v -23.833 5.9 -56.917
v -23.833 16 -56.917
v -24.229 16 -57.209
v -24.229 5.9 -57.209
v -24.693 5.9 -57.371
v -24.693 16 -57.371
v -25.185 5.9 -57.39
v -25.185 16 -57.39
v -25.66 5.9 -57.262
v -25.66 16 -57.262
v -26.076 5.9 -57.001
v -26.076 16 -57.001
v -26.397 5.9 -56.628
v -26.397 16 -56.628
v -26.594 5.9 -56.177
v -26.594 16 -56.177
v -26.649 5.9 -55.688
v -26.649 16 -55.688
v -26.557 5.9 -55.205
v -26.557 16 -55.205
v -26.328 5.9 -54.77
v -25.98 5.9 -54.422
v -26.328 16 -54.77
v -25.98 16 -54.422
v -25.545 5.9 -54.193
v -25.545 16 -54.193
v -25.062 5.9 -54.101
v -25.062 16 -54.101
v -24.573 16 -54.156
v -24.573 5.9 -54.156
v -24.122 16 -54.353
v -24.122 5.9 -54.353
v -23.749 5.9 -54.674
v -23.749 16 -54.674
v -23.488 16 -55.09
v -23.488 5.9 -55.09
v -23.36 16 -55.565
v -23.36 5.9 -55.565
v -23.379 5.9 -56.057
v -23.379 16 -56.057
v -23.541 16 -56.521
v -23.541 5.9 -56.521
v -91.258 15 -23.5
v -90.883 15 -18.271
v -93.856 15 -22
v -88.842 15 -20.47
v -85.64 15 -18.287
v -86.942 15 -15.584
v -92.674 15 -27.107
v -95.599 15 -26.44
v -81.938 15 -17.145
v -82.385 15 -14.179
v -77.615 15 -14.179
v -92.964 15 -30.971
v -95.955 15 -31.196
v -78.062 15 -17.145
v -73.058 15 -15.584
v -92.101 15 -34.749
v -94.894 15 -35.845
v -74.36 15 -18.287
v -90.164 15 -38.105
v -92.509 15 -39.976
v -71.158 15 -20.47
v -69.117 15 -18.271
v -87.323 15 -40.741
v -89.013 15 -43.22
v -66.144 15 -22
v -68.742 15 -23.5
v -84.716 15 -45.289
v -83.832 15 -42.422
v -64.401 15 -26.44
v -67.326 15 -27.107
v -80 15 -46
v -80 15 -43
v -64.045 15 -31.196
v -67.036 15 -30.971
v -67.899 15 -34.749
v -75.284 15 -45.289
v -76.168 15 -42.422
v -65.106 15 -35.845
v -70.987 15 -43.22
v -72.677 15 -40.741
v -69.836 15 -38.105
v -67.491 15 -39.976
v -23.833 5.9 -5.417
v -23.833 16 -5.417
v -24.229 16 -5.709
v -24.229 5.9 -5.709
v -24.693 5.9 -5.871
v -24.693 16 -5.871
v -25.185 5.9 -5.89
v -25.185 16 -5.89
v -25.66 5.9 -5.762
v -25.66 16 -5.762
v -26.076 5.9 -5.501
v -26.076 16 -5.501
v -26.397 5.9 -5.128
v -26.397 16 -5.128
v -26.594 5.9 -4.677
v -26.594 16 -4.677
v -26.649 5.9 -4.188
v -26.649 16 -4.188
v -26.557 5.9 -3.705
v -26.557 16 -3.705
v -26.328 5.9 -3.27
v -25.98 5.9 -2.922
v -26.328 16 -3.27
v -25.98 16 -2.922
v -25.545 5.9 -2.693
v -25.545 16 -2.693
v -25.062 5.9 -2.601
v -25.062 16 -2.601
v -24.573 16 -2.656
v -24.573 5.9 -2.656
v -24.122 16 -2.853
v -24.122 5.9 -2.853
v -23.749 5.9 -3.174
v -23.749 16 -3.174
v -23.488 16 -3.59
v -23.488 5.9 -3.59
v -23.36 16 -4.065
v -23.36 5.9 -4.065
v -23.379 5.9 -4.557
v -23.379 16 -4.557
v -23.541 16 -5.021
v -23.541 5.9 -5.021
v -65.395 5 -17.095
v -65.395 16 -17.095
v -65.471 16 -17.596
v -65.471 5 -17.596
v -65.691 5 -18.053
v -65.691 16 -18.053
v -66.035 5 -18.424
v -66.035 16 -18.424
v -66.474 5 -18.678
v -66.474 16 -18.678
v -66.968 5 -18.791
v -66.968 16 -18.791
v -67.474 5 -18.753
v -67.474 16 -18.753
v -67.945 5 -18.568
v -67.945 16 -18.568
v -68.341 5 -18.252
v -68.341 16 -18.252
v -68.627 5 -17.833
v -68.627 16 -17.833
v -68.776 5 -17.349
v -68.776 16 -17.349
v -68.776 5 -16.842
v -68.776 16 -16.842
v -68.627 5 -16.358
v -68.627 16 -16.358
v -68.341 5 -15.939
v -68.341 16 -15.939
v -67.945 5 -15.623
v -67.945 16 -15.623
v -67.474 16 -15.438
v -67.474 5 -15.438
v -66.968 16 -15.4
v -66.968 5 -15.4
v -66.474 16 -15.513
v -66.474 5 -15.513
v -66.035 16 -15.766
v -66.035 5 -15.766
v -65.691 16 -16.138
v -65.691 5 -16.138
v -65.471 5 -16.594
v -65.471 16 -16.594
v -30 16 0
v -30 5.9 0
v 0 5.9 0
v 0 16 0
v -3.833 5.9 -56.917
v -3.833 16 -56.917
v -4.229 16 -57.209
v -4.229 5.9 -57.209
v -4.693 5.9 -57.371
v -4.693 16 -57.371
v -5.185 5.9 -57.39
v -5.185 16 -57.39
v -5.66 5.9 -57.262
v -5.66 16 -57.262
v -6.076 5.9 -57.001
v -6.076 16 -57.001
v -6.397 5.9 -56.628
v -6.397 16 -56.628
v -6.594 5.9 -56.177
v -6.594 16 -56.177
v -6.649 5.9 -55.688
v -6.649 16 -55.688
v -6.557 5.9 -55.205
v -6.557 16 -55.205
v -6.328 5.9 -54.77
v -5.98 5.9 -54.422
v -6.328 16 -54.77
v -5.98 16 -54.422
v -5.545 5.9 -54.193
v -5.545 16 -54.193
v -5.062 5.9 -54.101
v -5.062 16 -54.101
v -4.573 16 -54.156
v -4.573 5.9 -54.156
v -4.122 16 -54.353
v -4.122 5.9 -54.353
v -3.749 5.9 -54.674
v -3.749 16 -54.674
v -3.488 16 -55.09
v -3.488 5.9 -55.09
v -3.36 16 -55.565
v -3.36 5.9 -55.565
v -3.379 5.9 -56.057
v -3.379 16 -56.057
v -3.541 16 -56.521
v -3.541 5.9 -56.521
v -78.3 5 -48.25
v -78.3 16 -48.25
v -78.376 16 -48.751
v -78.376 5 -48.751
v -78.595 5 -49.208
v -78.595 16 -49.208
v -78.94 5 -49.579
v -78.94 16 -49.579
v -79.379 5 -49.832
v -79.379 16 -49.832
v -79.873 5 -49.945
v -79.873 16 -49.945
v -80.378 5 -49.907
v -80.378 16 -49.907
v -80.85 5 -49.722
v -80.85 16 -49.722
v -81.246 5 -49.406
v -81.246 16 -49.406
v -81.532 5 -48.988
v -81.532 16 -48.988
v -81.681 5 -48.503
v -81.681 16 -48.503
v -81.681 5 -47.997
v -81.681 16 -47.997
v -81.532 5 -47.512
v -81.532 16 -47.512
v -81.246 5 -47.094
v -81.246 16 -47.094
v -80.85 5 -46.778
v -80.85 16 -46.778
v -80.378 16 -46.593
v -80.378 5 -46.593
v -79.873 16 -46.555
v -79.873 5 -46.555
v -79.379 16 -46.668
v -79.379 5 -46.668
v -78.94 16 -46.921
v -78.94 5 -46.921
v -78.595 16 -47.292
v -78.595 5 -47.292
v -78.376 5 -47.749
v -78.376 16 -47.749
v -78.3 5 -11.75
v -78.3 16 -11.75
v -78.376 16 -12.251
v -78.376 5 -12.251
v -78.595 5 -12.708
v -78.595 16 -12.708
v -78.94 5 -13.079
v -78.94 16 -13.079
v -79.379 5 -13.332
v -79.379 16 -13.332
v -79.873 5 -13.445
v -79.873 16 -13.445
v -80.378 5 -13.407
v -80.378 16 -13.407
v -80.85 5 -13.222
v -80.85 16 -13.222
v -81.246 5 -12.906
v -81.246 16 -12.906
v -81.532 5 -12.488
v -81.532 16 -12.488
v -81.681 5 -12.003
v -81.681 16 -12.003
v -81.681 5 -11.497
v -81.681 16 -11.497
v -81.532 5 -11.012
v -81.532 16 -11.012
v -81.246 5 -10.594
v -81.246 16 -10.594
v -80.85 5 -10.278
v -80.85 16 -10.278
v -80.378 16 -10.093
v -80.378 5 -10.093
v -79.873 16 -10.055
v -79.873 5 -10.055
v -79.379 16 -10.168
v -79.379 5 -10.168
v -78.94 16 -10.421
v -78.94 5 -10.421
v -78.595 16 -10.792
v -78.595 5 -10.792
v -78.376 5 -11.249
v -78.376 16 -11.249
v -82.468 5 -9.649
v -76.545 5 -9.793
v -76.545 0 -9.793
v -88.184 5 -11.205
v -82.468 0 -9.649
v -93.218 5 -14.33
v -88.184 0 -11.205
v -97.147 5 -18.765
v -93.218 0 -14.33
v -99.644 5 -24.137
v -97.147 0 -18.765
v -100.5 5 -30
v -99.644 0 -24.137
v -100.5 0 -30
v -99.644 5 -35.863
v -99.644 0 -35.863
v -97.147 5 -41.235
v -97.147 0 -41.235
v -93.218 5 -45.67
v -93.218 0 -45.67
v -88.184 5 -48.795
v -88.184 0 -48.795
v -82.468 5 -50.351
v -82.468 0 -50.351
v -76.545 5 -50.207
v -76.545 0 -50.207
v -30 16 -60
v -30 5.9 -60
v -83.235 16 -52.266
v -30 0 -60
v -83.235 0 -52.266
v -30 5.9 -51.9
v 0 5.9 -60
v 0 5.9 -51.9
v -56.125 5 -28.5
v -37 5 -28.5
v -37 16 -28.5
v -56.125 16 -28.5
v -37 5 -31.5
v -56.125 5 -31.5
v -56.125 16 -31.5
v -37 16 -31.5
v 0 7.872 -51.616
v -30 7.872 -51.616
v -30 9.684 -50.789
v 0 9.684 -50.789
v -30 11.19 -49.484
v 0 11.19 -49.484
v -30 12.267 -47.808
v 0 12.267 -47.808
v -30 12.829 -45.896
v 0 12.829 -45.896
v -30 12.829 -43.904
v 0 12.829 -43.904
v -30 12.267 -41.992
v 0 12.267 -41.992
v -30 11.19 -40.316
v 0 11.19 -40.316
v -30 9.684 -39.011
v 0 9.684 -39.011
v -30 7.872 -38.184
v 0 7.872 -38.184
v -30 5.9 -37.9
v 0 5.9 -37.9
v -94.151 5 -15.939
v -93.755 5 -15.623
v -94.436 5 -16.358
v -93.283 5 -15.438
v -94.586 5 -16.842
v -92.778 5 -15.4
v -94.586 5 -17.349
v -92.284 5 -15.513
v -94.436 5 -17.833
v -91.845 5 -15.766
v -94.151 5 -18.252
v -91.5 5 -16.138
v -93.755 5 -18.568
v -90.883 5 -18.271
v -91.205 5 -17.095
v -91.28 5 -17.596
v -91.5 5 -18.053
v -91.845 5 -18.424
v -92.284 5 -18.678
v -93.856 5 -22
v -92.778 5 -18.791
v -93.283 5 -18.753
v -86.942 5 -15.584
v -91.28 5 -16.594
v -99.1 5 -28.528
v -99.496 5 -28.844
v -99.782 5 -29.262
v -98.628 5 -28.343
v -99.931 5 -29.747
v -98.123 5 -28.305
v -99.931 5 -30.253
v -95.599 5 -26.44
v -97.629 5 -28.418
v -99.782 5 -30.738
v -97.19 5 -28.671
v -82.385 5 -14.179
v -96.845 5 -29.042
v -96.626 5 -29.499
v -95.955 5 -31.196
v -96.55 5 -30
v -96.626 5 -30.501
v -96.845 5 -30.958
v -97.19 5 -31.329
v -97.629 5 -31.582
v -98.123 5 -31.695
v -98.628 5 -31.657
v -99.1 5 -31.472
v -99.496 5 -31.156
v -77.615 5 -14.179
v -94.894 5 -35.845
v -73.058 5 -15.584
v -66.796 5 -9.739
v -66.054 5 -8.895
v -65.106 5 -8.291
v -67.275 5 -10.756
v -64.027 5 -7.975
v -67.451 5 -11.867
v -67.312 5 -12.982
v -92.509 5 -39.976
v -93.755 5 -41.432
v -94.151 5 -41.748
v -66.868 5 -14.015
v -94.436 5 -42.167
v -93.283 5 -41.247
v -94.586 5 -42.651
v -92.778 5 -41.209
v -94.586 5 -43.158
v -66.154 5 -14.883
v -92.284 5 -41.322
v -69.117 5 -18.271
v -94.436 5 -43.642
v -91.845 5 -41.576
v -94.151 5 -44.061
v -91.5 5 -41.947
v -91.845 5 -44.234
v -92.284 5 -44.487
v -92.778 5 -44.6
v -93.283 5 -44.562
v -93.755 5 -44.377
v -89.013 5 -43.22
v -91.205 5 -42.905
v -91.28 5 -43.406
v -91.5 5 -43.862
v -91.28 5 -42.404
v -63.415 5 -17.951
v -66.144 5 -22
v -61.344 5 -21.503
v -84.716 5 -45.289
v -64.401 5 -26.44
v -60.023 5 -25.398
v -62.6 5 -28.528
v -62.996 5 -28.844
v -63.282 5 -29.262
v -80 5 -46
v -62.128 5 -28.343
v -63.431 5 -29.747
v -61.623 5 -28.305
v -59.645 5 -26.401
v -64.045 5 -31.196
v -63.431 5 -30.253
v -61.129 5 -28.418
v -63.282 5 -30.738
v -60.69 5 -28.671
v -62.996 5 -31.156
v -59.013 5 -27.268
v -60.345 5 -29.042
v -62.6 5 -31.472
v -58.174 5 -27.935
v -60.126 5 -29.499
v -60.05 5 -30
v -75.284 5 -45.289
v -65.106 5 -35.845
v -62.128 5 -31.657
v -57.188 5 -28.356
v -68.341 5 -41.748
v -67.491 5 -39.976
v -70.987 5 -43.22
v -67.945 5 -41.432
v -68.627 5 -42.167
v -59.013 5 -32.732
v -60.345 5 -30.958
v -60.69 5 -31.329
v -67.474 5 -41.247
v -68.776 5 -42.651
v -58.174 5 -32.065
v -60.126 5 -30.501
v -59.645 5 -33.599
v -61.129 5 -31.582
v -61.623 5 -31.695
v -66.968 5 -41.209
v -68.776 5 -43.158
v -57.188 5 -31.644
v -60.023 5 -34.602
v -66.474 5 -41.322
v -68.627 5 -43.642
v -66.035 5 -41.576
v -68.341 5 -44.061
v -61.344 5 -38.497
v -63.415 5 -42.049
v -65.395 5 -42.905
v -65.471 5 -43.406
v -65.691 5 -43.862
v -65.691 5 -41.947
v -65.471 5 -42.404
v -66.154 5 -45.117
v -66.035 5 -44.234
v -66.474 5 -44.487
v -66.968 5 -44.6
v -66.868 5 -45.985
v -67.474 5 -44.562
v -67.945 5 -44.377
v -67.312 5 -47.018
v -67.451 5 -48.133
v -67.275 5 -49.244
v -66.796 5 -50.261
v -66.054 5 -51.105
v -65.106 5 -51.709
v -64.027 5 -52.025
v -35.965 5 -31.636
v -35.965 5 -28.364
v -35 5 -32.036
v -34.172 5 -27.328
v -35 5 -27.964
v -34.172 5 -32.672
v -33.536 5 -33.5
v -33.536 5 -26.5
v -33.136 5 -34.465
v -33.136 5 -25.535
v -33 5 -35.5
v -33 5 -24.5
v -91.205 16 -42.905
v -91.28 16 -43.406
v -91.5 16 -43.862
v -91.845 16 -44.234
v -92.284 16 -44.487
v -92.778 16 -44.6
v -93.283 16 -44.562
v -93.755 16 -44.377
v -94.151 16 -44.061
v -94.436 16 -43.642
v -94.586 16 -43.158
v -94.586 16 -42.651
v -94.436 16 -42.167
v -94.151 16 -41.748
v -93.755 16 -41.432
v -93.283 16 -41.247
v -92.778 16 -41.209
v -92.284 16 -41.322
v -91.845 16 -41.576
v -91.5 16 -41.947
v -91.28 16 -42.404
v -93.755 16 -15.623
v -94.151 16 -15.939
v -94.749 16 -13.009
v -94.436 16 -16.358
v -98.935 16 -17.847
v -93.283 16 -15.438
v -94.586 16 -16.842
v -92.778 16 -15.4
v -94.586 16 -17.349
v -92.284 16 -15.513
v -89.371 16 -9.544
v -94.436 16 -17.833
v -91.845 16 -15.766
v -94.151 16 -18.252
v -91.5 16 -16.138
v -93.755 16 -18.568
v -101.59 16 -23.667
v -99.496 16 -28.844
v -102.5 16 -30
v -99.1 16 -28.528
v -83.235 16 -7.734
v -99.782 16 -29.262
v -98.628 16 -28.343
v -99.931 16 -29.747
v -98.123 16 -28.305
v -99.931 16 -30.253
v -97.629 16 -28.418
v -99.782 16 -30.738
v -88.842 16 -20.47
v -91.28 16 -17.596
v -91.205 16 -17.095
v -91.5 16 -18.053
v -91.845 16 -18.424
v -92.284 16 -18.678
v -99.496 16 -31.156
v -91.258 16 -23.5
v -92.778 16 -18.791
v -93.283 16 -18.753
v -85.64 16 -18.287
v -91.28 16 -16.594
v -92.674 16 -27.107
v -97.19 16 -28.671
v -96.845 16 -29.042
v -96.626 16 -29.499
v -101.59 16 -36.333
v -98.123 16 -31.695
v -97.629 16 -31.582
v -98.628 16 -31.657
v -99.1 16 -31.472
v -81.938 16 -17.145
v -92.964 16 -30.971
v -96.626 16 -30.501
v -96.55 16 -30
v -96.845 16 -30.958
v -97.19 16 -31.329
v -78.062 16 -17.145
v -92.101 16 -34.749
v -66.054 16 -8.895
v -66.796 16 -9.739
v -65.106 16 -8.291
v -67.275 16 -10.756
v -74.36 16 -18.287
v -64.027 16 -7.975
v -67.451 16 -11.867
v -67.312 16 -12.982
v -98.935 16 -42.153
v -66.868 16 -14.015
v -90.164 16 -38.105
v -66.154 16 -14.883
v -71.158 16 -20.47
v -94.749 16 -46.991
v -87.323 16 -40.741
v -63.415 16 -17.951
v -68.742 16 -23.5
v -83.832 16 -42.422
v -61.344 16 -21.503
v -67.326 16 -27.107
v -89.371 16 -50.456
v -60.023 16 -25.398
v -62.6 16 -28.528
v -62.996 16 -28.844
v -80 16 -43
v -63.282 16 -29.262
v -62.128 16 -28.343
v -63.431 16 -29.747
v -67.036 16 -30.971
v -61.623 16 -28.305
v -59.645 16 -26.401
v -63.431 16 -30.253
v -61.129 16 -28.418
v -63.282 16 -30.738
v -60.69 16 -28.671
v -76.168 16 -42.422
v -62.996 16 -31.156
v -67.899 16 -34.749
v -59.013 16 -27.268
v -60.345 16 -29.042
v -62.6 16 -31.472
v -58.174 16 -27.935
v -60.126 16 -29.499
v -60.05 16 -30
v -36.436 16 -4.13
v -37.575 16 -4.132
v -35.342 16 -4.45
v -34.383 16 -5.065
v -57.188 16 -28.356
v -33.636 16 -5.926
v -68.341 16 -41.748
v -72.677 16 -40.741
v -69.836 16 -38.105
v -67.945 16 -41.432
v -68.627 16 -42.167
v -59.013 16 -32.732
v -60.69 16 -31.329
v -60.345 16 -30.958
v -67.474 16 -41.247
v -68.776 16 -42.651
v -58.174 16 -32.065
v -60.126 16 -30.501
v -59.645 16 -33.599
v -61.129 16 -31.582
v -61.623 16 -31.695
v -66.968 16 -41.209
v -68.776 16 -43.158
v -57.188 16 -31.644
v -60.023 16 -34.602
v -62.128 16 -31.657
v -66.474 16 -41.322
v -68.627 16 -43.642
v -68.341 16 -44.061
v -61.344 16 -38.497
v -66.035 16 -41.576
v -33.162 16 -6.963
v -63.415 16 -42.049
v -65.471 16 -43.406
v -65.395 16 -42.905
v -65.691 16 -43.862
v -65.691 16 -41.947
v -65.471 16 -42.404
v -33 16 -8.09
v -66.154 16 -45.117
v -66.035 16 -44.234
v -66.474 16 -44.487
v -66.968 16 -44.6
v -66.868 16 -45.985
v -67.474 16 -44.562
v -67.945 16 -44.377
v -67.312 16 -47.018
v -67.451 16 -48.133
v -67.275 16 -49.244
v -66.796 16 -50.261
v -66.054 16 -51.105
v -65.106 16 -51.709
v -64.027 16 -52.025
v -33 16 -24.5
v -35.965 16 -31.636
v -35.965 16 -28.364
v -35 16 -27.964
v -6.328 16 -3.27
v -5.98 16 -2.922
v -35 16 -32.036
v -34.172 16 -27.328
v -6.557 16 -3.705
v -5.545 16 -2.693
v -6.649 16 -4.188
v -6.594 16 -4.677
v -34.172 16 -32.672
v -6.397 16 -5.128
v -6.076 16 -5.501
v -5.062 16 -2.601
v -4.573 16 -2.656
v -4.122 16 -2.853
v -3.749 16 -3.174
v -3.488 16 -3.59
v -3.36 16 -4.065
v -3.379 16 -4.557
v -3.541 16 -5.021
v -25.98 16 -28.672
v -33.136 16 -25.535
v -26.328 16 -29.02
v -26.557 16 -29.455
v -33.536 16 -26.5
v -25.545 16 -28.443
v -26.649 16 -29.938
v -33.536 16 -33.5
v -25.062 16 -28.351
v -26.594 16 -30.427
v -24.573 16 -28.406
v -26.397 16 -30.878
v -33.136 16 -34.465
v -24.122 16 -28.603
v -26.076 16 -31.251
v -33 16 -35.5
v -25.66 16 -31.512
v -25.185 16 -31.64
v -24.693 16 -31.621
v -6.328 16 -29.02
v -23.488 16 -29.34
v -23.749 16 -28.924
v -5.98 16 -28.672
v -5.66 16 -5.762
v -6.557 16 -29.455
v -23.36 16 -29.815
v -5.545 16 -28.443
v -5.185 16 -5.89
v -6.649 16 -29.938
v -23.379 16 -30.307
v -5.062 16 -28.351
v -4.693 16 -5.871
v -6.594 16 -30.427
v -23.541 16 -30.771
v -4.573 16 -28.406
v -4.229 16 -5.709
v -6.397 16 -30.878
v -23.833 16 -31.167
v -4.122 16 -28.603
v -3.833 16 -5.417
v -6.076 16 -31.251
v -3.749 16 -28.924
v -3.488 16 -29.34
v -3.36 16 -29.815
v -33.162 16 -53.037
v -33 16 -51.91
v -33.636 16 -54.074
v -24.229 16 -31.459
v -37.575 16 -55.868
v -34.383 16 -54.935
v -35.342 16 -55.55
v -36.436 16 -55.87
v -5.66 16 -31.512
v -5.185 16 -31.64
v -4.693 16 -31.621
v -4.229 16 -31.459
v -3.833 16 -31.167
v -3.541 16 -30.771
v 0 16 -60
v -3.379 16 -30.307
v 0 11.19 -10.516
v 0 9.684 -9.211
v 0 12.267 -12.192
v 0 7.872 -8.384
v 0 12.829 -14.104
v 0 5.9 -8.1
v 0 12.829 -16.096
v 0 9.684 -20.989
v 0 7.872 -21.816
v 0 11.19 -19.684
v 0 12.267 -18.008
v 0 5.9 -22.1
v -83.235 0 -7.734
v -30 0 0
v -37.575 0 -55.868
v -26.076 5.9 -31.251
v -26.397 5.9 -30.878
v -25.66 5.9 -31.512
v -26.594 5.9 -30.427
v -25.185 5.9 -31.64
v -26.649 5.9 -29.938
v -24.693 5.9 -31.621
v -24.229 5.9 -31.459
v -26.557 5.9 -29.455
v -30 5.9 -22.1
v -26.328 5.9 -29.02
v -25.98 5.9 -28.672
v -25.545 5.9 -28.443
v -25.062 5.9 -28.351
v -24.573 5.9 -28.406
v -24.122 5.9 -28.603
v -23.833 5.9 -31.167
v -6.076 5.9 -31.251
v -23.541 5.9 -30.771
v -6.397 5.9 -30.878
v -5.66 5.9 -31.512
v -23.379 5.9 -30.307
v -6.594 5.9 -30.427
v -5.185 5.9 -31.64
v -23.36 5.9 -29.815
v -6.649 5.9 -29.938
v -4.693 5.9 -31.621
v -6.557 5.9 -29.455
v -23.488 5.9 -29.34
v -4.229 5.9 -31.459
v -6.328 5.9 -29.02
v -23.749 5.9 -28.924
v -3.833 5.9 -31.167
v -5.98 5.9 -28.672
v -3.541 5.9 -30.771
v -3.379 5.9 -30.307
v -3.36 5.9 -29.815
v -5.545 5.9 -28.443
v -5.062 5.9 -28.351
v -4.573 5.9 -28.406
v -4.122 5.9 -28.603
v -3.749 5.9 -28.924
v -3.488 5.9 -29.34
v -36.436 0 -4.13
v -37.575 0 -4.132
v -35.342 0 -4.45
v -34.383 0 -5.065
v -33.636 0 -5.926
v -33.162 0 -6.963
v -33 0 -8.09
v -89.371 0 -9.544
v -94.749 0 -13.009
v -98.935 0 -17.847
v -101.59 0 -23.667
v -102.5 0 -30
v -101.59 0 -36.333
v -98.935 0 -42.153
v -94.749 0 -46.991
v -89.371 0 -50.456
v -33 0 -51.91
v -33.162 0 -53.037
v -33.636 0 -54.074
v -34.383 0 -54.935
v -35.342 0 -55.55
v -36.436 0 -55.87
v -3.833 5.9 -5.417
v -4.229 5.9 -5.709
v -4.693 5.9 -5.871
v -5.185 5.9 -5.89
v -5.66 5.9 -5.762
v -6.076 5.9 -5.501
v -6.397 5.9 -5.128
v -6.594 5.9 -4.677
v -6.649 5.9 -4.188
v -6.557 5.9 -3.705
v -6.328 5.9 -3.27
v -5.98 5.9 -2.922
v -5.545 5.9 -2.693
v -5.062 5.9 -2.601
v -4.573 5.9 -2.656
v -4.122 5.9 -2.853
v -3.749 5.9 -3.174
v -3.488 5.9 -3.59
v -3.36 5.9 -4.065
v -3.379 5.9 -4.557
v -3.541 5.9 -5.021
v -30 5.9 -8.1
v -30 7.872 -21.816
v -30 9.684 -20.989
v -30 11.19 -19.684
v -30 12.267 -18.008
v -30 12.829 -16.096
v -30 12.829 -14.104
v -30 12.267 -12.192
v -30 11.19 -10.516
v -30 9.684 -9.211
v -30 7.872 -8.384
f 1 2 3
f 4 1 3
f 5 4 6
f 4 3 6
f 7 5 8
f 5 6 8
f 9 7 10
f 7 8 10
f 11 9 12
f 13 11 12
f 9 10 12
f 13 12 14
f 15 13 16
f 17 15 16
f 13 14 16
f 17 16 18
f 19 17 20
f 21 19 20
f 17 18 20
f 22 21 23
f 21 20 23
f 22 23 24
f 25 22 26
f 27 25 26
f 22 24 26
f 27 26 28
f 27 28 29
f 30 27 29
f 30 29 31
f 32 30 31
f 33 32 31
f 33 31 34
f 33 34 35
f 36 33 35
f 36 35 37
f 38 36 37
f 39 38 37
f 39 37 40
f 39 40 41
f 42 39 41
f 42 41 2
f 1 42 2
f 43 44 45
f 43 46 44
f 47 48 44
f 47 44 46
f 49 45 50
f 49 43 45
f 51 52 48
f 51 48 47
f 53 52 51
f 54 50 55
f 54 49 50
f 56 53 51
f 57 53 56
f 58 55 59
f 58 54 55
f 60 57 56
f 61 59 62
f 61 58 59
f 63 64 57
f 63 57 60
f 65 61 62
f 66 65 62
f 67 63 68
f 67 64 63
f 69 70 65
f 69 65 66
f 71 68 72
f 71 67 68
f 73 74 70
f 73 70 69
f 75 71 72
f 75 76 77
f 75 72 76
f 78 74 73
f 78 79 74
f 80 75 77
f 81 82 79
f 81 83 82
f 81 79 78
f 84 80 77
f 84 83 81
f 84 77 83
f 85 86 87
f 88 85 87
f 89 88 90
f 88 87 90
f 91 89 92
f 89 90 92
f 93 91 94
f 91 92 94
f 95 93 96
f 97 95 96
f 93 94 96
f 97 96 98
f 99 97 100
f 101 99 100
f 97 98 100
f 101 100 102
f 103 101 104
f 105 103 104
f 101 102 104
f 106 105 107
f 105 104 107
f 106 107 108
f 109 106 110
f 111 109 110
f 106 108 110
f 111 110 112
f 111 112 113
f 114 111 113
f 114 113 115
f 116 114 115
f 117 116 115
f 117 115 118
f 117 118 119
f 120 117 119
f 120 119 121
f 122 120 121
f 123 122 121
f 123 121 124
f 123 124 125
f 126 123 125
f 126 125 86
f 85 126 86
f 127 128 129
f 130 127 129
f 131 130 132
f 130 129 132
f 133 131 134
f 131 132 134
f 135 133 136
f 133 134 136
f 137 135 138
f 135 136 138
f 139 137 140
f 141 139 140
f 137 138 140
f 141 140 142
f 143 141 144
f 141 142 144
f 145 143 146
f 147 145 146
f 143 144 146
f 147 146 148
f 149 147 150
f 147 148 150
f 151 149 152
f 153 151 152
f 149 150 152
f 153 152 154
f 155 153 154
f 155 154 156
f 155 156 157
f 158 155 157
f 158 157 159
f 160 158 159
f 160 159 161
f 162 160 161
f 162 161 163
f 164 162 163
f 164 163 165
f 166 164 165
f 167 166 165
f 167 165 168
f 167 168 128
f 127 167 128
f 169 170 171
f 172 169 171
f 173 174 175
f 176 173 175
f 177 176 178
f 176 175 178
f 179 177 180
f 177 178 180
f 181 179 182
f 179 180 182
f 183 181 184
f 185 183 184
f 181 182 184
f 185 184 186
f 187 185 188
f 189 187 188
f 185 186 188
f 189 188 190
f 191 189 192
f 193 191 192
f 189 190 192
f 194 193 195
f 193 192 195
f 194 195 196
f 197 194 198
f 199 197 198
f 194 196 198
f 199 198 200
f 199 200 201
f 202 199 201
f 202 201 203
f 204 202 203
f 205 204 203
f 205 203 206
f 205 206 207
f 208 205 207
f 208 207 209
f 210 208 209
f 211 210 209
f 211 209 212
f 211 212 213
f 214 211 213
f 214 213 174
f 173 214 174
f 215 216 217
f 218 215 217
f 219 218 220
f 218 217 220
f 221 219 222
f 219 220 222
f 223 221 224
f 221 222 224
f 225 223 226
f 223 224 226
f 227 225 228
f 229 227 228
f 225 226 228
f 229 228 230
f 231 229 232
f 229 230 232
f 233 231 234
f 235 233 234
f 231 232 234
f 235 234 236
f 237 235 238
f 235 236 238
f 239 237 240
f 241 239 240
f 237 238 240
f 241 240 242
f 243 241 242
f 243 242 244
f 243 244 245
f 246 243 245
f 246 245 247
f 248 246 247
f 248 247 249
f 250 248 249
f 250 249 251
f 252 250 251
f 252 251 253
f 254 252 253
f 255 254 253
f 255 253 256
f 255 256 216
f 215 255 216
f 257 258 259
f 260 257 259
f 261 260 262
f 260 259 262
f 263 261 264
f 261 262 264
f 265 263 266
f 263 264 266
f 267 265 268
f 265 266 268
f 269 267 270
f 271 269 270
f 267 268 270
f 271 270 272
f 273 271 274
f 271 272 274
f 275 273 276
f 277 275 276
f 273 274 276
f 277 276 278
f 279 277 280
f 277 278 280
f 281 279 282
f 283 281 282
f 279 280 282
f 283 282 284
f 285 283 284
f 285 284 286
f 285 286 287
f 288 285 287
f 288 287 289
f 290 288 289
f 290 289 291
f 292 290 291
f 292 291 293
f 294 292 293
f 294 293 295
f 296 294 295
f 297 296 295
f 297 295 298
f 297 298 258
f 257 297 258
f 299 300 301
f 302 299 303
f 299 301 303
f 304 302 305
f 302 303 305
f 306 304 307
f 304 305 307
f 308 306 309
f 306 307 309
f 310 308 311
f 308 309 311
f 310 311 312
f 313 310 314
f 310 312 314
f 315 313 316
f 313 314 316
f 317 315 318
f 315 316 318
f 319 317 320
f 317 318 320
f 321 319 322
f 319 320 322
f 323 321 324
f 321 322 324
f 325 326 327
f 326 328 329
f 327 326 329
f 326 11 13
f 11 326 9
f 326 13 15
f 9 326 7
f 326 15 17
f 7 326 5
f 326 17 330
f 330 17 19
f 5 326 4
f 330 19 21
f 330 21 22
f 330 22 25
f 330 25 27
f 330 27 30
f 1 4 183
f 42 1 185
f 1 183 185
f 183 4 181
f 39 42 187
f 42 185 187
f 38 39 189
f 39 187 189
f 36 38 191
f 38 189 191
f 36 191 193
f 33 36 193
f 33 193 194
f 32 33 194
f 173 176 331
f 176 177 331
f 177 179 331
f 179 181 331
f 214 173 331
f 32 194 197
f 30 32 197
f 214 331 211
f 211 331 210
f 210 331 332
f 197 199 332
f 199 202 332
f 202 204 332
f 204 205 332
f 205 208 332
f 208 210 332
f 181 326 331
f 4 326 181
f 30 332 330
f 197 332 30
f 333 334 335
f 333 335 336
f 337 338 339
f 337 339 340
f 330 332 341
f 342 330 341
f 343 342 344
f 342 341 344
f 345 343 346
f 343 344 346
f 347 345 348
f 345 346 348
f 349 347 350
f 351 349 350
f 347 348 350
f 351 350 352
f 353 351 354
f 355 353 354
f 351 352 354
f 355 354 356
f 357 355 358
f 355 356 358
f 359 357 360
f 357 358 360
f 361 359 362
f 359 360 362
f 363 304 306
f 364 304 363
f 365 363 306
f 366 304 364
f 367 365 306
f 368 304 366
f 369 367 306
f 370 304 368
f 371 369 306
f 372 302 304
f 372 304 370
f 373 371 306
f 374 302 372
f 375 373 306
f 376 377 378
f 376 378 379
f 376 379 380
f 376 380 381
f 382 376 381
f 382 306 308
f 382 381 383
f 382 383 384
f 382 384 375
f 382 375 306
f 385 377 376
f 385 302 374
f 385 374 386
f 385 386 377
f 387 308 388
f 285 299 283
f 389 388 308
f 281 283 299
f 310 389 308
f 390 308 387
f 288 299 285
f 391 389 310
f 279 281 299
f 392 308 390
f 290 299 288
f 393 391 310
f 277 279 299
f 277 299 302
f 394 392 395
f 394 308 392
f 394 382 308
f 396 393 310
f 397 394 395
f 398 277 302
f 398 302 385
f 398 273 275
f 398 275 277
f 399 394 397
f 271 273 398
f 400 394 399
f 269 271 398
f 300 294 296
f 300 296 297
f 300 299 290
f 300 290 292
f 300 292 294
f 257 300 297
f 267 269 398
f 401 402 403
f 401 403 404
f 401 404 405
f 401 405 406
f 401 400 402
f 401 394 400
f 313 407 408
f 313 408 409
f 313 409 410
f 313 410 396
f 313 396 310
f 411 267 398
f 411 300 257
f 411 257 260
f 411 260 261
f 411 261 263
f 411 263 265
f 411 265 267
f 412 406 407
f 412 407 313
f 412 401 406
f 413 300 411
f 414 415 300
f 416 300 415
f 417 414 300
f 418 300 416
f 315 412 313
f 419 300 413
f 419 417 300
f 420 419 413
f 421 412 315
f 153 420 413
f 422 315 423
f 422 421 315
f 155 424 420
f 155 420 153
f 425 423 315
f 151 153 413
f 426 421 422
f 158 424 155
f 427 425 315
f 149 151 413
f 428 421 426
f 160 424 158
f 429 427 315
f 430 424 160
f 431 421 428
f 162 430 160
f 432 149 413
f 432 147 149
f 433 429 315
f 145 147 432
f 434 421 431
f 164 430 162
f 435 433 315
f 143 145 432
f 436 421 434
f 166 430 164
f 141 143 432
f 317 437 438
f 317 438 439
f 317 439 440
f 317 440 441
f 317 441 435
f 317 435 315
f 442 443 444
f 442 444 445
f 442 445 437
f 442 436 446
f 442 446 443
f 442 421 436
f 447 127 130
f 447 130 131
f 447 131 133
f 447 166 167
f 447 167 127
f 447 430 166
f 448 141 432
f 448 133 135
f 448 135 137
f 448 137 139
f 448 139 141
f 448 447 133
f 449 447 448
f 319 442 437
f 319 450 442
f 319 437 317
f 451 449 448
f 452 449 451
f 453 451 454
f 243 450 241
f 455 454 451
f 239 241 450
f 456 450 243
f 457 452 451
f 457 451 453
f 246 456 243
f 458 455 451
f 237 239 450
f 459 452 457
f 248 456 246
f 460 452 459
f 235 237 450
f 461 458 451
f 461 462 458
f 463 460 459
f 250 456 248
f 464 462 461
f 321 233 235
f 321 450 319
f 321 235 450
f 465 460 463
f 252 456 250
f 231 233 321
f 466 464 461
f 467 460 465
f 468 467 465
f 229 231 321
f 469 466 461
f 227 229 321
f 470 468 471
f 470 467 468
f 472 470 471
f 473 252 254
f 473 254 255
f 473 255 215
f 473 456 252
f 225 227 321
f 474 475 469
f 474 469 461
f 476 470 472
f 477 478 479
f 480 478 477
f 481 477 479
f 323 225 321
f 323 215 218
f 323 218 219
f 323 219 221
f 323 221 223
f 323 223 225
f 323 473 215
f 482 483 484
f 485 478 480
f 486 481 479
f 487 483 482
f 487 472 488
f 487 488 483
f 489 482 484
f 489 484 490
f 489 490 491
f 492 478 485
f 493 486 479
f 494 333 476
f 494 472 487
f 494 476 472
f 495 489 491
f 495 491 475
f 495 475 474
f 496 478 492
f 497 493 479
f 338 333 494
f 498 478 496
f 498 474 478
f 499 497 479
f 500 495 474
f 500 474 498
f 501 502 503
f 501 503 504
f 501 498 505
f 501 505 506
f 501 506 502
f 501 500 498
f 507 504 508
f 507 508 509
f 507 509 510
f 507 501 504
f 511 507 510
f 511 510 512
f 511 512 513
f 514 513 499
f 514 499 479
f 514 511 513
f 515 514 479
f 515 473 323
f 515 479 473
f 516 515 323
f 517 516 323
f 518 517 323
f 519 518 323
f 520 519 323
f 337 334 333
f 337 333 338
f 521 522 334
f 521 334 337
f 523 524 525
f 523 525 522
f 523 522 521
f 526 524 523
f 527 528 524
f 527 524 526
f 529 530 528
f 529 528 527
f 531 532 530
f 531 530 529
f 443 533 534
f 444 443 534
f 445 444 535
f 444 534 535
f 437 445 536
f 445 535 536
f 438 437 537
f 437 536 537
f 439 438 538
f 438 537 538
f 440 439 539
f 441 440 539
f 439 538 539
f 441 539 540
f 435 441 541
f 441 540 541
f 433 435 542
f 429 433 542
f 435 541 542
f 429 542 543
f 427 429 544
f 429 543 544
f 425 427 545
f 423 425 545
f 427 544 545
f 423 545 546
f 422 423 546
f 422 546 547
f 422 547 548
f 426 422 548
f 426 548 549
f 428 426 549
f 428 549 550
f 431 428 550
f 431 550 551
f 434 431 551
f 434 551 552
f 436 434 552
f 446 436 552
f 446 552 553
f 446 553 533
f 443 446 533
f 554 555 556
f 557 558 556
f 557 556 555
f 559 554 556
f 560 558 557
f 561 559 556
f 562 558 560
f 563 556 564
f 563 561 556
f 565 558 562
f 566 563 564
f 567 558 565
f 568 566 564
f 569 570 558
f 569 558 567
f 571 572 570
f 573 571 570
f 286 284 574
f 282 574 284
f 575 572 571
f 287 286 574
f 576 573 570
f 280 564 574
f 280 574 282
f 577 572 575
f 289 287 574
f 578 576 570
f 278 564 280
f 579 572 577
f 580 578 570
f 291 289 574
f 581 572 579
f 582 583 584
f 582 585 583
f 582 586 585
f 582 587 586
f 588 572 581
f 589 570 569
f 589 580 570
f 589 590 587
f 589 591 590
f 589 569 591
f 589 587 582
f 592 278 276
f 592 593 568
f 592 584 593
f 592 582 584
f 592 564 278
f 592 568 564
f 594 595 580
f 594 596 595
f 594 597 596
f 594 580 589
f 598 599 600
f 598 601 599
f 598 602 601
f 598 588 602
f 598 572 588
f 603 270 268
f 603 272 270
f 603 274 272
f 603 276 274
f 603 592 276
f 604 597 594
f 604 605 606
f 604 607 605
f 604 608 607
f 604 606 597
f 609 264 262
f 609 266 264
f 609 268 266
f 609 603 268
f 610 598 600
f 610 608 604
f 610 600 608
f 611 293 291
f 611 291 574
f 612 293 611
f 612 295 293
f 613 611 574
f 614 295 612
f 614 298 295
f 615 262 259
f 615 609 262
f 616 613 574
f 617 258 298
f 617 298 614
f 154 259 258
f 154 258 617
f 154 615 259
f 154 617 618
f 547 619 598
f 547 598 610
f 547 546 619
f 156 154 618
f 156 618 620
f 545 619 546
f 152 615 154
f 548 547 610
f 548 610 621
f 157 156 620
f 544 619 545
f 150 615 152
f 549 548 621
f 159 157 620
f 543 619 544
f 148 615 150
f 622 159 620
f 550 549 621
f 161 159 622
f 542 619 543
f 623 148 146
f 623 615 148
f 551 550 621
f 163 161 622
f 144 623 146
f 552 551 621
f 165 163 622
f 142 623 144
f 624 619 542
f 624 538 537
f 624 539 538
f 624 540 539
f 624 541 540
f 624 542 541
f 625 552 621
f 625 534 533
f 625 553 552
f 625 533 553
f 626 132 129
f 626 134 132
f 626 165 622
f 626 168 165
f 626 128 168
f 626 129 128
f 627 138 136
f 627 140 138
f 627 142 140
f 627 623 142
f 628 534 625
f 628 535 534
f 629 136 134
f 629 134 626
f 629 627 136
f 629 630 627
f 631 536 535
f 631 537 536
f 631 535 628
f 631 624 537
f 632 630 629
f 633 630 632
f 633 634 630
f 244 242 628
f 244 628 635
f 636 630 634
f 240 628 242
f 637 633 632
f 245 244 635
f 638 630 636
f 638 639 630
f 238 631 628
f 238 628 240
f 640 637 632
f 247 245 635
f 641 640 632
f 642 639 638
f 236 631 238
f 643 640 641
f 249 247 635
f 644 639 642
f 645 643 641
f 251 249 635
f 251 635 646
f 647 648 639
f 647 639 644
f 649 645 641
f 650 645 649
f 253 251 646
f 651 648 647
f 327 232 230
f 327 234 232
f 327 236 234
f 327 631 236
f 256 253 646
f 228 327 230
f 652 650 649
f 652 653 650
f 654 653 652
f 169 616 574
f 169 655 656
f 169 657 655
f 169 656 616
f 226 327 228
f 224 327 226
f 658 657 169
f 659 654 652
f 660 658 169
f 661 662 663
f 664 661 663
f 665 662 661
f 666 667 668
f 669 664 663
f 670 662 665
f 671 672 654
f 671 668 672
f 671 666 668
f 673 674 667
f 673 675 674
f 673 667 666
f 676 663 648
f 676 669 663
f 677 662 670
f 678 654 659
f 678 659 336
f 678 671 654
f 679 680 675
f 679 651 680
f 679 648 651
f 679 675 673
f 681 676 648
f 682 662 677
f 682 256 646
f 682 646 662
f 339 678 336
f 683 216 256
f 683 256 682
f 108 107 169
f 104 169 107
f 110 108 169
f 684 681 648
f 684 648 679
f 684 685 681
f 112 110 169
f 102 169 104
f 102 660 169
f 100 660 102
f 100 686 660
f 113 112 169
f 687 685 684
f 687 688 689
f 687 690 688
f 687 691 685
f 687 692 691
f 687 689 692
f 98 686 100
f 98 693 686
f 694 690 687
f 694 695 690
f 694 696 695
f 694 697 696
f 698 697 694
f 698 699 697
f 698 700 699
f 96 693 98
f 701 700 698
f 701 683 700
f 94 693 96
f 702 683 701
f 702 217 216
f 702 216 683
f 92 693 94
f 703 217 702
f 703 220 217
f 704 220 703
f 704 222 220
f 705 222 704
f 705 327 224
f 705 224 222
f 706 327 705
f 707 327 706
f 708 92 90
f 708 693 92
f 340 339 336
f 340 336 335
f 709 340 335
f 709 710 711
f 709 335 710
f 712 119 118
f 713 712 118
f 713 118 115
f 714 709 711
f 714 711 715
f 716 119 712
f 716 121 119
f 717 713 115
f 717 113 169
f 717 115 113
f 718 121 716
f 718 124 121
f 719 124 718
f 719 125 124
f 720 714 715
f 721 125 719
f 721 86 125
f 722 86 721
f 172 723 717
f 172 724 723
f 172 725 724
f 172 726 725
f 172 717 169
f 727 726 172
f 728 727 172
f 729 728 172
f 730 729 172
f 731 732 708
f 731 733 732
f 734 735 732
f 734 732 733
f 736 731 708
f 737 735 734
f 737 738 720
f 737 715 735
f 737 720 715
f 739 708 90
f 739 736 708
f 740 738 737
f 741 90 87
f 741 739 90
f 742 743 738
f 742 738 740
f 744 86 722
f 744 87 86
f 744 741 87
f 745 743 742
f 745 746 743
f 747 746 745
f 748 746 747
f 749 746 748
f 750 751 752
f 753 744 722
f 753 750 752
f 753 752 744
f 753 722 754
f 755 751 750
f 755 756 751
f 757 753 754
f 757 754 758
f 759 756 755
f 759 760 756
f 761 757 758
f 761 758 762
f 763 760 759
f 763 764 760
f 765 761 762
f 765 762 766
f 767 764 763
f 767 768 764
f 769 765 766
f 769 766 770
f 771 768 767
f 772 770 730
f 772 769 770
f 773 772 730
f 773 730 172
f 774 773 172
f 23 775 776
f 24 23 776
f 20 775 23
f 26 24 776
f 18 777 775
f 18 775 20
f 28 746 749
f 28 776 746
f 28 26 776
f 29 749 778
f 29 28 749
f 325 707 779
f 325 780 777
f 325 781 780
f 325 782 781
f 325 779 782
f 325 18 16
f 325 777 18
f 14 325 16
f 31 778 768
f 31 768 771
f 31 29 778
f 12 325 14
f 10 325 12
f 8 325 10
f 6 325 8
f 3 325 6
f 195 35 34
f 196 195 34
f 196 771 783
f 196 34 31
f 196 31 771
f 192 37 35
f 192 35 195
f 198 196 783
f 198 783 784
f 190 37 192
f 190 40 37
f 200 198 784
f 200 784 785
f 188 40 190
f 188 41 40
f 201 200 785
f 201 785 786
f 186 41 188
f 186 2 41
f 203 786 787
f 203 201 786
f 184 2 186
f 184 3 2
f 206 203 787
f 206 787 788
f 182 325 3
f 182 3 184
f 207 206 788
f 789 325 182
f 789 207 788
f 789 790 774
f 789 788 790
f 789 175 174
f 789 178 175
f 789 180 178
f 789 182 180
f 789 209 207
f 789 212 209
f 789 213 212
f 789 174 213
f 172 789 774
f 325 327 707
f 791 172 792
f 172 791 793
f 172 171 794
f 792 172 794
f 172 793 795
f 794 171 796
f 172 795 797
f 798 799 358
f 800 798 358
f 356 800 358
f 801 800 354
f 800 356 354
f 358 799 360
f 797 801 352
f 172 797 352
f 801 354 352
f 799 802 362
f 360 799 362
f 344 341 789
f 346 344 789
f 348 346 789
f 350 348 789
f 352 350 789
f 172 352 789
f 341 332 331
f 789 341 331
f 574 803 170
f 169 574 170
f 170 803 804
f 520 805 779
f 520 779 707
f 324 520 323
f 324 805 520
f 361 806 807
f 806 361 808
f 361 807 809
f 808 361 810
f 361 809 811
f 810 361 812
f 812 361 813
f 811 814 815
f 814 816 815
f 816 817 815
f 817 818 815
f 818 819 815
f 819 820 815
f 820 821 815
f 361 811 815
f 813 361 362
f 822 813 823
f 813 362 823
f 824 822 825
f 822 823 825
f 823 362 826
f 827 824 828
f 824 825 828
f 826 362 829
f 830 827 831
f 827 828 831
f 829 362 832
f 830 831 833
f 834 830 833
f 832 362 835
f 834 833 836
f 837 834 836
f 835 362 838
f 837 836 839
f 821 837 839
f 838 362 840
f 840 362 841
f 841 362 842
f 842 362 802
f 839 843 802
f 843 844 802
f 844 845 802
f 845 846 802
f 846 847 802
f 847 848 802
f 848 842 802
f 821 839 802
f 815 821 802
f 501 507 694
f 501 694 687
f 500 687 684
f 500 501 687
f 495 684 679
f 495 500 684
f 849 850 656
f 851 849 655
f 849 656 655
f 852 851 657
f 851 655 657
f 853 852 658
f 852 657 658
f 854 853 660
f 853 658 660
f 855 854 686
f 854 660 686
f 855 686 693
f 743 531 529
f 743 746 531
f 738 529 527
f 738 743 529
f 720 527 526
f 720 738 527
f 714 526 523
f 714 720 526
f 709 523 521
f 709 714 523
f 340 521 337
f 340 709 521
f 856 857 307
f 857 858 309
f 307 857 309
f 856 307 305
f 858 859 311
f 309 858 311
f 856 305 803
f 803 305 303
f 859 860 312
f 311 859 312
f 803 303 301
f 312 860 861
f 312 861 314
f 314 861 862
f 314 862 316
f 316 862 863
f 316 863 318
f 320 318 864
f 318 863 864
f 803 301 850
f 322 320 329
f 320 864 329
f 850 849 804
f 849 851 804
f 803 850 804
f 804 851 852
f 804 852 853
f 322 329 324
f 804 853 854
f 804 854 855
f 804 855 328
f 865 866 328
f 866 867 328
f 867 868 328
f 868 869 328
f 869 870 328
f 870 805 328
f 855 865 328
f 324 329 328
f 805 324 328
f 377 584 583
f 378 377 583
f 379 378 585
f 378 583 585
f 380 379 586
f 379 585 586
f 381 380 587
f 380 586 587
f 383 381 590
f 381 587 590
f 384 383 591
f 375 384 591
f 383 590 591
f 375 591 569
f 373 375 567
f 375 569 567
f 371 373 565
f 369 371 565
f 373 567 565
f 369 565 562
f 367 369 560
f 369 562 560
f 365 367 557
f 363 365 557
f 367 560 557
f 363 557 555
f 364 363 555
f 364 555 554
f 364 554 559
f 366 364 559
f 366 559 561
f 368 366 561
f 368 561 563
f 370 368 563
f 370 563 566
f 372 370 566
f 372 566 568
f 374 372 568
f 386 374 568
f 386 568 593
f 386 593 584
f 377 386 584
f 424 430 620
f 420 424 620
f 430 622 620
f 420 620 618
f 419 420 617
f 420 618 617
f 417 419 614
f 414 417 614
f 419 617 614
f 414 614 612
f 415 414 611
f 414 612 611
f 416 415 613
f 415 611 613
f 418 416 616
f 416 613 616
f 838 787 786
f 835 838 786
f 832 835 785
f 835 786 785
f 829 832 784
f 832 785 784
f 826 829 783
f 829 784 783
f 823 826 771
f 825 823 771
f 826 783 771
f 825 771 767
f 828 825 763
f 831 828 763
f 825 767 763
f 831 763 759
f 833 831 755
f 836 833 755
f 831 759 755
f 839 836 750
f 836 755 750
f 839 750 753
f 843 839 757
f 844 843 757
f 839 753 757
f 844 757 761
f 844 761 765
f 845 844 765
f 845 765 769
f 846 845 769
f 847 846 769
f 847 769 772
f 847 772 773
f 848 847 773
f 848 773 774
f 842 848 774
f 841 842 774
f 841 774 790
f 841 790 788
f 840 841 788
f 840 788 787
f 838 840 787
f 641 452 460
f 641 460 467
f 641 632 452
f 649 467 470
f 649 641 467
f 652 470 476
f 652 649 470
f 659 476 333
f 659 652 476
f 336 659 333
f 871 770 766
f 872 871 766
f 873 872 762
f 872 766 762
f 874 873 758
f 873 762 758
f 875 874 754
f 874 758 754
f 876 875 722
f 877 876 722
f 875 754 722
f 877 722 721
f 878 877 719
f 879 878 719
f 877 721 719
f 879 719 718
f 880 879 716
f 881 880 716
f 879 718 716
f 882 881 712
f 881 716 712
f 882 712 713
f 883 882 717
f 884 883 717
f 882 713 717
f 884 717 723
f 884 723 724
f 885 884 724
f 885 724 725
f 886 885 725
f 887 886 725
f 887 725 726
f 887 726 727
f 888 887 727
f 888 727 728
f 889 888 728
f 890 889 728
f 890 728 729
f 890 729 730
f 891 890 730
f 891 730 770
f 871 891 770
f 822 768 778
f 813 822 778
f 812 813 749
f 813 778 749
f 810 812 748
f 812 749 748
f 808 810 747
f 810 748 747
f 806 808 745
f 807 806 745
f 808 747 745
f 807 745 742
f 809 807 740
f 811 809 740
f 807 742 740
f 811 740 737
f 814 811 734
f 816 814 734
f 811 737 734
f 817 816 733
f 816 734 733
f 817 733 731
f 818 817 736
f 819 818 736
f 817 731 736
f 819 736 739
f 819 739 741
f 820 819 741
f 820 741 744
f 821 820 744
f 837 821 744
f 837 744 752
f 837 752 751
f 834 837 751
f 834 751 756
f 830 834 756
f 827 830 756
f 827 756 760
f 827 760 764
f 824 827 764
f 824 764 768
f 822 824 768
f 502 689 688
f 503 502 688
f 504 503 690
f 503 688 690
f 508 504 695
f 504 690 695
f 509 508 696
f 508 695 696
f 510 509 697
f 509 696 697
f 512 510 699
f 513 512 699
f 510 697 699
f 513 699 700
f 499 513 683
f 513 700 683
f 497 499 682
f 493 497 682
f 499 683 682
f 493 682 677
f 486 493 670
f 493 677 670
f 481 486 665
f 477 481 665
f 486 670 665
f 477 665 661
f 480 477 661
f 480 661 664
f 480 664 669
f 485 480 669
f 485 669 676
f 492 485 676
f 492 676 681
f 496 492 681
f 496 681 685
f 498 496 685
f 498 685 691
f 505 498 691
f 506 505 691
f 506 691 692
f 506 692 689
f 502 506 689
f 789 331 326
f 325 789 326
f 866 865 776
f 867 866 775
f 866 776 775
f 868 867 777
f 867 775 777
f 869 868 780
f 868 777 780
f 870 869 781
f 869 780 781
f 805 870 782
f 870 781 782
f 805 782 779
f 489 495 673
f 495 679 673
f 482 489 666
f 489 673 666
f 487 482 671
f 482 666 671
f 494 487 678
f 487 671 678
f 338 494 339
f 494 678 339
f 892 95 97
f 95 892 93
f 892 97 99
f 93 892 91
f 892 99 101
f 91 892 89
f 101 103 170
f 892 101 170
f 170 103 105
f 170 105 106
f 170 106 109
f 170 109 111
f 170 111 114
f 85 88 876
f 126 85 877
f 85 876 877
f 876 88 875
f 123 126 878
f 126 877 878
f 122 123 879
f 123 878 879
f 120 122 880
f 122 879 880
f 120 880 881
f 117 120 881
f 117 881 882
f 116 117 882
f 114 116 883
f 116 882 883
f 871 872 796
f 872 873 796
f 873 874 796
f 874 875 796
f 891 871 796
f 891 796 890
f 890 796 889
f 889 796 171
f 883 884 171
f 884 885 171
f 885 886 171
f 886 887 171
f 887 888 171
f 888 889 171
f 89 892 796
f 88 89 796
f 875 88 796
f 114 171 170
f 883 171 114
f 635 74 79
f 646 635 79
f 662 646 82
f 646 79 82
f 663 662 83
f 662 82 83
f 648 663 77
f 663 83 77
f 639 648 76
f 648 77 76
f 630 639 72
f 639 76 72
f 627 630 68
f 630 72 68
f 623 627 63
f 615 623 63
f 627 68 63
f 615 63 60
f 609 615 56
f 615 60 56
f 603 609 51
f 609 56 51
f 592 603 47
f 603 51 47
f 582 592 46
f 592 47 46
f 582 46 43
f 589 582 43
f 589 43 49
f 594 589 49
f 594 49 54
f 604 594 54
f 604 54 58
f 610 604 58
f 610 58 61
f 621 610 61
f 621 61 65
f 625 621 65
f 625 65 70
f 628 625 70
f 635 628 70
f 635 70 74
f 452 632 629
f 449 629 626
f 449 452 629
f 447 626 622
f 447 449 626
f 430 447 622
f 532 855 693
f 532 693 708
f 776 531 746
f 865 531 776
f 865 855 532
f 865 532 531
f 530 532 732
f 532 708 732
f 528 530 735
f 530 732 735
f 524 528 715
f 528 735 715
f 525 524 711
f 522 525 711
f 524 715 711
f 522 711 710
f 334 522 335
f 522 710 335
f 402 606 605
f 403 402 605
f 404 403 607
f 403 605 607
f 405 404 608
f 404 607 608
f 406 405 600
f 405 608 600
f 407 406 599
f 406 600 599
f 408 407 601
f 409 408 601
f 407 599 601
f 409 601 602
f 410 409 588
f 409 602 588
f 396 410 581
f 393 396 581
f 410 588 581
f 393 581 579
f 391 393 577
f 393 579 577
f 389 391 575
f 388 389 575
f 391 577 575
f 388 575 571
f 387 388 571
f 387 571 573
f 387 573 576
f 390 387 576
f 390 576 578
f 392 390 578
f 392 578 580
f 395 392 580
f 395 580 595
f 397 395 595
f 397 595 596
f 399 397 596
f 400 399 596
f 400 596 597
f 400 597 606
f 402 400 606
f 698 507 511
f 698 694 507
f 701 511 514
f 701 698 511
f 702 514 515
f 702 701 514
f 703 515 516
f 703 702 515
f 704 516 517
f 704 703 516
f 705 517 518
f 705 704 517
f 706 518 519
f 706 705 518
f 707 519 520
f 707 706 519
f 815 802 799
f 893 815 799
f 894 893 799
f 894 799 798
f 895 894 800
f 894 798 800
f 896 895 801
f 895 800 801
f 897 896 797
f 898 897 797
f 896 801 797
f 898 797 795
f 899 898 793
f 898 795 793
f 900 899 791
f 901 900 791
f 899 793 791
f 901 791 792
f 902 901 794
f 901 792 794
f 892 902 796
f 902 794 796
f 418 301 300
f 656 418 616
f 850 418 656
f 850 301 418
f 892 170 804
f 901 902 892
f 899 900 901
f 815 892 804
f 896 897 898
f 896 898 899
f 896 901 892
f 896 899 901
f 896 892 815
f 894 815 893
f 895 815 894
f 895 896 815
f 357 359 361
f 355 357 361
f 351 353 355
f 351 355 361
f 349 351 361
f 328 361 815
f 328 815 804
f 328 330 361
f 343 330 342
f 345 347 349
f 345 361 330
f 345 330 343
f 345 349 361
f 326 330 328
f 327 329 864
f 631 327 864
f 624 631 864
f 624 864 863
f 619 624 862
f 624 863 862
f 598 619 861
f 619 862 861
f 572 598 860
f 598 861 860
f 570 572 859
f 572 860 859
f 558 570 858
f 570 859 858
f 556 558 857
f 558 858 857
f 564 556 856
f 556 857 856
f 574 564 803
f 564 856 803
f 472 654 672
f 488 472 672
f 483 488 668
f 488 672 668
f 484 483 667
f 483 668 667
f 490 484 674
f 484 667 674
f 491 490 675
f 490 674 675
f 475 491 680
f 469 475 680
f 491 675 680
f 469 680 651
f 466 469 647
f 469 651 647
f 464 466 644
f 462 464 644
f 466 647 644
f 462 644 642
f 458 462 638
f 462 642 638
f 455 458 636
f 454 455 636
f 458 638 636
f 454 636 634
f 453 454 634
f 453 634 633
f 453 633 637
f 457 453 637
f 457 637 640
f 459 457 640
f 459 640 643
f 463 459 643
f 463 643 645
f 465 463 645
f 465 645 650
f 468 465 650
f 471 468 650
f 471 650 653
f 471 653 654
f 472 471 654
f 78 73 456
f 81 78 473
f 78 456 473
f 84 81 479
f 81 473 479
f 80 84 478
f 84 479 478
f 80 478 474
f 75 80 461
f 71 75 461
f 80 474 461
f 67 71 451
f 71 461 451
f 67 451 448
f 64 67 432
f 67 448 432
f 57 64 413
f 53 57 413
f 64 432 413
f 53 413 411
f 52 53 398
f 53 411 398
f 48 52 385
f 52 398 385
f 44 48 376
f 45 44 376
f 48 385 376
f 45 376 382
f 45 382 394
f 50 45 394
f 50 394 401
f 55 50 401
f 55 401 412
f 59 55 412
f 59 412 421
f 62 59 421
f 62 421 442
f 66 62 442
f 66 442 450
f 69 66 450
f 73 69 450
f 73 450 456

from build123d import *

# Parameters (mm, degrees)
EXTRUDE_1_DEPTH      = 16
SKETCH_2_R           = 16
CUT_EXTRUDE_1_DEPTH  = 15
SKETCH_3_R           = 13
CUT_EXTRUDE_2_DEPTH  = 120.713198938
SKETCH_4_R           = 20.5
CUT_EXTRUDE_3_DEPTH  = 5
HOLE_WIZARD_M32_D    = 3.4
CUT_EXTRUDE_8_DEPTH  = 30
CUT_EXTRUDE_11_DEPTH = 120.842605112
EXTRUDE_2_DEPTH      = 11
FILLET_1_R           = 4
M4X0_71_D            = 3.3


with BuildPart() as part:
    # Эскиз1 → Бобышка-Вытянуть1 (new body)
    with BuildSketch(Plane(origin=(0, 0, 0), x_dir=(1, 0, 0), z_dir=(0, 1, 0))):
        with BuildLine():
            Line((0, 0), (0, 60))
            Line((0, 60), (-30, 60))
            Line((-30, 60), (-83.234756238, 52.266260397))
            ThreePointArc((-83.234756238, 52.266260397), (-102.5, 30), (-83.234756238, 7.733739603))
            Line((-83.234756238, 7.733739603), (-30, 0))
            Line((-30, 0), (0, 0))
        make_face()
    extrude(amount=EXTRUDE_1_DEPTH)

    # Эскиз2 → Вырез-Вытянуть1 (cut)
    with BuildSketch(Plane.XZ):
        with Locations(Location((-80, -30, 0), (0, 0, 270))):
            Circle(SKETCH_2_R)
    extrude(amount=-CUT_EXTRUDE_1_DEPTH, mode=Mode.SUBTRACT)

    # Эскиз3 → Вырез-Вытянуть2 (cut, through all)
    with BuildSketch(Plane.XZ.offset(-15)):
        with Locations(Location((-80, -30, 0), (0, 0, 270))):
            Circle(SKETCH_3_R)
    extrude(amount=-CUT_EXTRUDE_2_DEPTH, mode=Mode.SUBTRACT)

    # Эскиз4 → Вырез-Вытянуть3 (cut)
    with BuildSketch(Plane.XZ):
        with Locations(Location((-80, -30, 0), (0, 0, 270))):
            Circle(SKETCH_4_R)
    extrude(amount=-CUT_EXTRUDE_3_DEPTH, mode=Mode.SUBTRACT)

    # Отверстие с зазором M32 (through all)
    with Locations(Plane(origin=(0, 5, 0), x_dir=(-1, 0, 0), z_dir=(0, -1, 0))):
        with Locations((92.904698757, 17.095301243), (67.095301243, 17.095301243), (67.095301243, 42.904698757), (92.904698757, 42.904698757), (80, 11.75), (61.75, 30), (80, 48.25), (98.25, 30)):
            Hole(HOLE_WIZARD_M32_D / 2)

    # Эскиз8 → Вырез-Вытянуть8 (cut)
    with BuildSketch(Plane(origin=(0, 0, 0), x_dir=(0, 0, -1), z_dir=(1, 0, 0))):
        with BuildLine():
            Line((37.9, 5.9), (22.1, 5.9))
            ThreePointArc((22.1, 5.9), (15.1, 12.9), (8.1, 5.9))
            Line((8.1, 5.9), (0, 5.9))
            Line((0, 5.9), (0, 0))
            Line((0, 0), (60, 0))
            Line((60, 0), (60, 5.9))
            Line((60, 5.9), (51.9, 5.9))
            ThreePointArc((51.9, 5.9), (44.9, 12.9), (37.9, 5.9))
        make_face()
    extrude(amount=-CUT_EXTRUDE_8_DEPTH, mode=Mode.SUBTRACT)

    # Эскиз14 → Вырез-Вытянуть11 (cut, through all)
    with BuildSketch(Plane.XZ):
        with BuildLine():
            Line((-33, -56.53267916), (-76.544602266, -50.206687668))
            ThreePointArc((-76.544602266, -50.206687668), (-59.5, -30), (-76.544602266, -9.793312332))
            Line((-76.544602266, -9.793312332), (-33, -3.46732084))
            Line((-33, -3.46732084), (-33, -56.53267916))
        make_face()
    extrude(amount=-CUT_EXTRUDE_11_DEPTH, mode=Mode.SUBTRACT)

    # Эскиз15 → Бобышка-Вытянуть2 (add, through all)
    with BuildSketch(Plane.XZ.offset(-5)):
        with BuildLine():
            Line((-59.5549517, -31.5), (-33, -31.5))
            Line((-33, -31.5), (-33, -28.5))
            Line((-33, -28.5), (-59.5549517, -28.5))
            ThreePointArc((-59.5549517, -28.5), (-59.5, -30), (-59.5549517, -31.5))
        make_face()
    extrude(amount=-EXTRUDE_2_DEPTH)

    # Скругление1
    fillet_1_edges = [part.edges().sort_by_distance(p)[0] for p in [
        (-76.544602266, 10.5, -50.206687668),
        (-76.544602266, 10.5, -9.793312332),
        (-33, 8, -3.46732084),
        (-33, 8, -56.53267916),
        (-33, 10.5, -28.5),
        (-33, 10.5, -31.5),
        (-59.5549517, 10.5, -31.5),
        (-59.5549517, 10.5, -28.5),
    ]]
    fillet(fillet_1_edges, radius=FILLET_1_R)

    # Отверстие обработанное метчиком M4x0.71 (through all)
    with Locations(Plane(origin=(-72.539630463, 5.9, -28.004308474), x_dir=(-0.7071067811865468, 0, 0.7071067811865482), z_dir=(0, -1, 0))):
        with Locations((-67.376897326, -28.138564072), (-53.234761703, -13.996428448), (-35.026762087, -32.204428064), (-49.168897711, -46.346563688), (-30.960898095, -64.554563303), (-16.818762471, -50.412427679)):
            Hole(M4X0_71_D / 2)


solid = part.part
